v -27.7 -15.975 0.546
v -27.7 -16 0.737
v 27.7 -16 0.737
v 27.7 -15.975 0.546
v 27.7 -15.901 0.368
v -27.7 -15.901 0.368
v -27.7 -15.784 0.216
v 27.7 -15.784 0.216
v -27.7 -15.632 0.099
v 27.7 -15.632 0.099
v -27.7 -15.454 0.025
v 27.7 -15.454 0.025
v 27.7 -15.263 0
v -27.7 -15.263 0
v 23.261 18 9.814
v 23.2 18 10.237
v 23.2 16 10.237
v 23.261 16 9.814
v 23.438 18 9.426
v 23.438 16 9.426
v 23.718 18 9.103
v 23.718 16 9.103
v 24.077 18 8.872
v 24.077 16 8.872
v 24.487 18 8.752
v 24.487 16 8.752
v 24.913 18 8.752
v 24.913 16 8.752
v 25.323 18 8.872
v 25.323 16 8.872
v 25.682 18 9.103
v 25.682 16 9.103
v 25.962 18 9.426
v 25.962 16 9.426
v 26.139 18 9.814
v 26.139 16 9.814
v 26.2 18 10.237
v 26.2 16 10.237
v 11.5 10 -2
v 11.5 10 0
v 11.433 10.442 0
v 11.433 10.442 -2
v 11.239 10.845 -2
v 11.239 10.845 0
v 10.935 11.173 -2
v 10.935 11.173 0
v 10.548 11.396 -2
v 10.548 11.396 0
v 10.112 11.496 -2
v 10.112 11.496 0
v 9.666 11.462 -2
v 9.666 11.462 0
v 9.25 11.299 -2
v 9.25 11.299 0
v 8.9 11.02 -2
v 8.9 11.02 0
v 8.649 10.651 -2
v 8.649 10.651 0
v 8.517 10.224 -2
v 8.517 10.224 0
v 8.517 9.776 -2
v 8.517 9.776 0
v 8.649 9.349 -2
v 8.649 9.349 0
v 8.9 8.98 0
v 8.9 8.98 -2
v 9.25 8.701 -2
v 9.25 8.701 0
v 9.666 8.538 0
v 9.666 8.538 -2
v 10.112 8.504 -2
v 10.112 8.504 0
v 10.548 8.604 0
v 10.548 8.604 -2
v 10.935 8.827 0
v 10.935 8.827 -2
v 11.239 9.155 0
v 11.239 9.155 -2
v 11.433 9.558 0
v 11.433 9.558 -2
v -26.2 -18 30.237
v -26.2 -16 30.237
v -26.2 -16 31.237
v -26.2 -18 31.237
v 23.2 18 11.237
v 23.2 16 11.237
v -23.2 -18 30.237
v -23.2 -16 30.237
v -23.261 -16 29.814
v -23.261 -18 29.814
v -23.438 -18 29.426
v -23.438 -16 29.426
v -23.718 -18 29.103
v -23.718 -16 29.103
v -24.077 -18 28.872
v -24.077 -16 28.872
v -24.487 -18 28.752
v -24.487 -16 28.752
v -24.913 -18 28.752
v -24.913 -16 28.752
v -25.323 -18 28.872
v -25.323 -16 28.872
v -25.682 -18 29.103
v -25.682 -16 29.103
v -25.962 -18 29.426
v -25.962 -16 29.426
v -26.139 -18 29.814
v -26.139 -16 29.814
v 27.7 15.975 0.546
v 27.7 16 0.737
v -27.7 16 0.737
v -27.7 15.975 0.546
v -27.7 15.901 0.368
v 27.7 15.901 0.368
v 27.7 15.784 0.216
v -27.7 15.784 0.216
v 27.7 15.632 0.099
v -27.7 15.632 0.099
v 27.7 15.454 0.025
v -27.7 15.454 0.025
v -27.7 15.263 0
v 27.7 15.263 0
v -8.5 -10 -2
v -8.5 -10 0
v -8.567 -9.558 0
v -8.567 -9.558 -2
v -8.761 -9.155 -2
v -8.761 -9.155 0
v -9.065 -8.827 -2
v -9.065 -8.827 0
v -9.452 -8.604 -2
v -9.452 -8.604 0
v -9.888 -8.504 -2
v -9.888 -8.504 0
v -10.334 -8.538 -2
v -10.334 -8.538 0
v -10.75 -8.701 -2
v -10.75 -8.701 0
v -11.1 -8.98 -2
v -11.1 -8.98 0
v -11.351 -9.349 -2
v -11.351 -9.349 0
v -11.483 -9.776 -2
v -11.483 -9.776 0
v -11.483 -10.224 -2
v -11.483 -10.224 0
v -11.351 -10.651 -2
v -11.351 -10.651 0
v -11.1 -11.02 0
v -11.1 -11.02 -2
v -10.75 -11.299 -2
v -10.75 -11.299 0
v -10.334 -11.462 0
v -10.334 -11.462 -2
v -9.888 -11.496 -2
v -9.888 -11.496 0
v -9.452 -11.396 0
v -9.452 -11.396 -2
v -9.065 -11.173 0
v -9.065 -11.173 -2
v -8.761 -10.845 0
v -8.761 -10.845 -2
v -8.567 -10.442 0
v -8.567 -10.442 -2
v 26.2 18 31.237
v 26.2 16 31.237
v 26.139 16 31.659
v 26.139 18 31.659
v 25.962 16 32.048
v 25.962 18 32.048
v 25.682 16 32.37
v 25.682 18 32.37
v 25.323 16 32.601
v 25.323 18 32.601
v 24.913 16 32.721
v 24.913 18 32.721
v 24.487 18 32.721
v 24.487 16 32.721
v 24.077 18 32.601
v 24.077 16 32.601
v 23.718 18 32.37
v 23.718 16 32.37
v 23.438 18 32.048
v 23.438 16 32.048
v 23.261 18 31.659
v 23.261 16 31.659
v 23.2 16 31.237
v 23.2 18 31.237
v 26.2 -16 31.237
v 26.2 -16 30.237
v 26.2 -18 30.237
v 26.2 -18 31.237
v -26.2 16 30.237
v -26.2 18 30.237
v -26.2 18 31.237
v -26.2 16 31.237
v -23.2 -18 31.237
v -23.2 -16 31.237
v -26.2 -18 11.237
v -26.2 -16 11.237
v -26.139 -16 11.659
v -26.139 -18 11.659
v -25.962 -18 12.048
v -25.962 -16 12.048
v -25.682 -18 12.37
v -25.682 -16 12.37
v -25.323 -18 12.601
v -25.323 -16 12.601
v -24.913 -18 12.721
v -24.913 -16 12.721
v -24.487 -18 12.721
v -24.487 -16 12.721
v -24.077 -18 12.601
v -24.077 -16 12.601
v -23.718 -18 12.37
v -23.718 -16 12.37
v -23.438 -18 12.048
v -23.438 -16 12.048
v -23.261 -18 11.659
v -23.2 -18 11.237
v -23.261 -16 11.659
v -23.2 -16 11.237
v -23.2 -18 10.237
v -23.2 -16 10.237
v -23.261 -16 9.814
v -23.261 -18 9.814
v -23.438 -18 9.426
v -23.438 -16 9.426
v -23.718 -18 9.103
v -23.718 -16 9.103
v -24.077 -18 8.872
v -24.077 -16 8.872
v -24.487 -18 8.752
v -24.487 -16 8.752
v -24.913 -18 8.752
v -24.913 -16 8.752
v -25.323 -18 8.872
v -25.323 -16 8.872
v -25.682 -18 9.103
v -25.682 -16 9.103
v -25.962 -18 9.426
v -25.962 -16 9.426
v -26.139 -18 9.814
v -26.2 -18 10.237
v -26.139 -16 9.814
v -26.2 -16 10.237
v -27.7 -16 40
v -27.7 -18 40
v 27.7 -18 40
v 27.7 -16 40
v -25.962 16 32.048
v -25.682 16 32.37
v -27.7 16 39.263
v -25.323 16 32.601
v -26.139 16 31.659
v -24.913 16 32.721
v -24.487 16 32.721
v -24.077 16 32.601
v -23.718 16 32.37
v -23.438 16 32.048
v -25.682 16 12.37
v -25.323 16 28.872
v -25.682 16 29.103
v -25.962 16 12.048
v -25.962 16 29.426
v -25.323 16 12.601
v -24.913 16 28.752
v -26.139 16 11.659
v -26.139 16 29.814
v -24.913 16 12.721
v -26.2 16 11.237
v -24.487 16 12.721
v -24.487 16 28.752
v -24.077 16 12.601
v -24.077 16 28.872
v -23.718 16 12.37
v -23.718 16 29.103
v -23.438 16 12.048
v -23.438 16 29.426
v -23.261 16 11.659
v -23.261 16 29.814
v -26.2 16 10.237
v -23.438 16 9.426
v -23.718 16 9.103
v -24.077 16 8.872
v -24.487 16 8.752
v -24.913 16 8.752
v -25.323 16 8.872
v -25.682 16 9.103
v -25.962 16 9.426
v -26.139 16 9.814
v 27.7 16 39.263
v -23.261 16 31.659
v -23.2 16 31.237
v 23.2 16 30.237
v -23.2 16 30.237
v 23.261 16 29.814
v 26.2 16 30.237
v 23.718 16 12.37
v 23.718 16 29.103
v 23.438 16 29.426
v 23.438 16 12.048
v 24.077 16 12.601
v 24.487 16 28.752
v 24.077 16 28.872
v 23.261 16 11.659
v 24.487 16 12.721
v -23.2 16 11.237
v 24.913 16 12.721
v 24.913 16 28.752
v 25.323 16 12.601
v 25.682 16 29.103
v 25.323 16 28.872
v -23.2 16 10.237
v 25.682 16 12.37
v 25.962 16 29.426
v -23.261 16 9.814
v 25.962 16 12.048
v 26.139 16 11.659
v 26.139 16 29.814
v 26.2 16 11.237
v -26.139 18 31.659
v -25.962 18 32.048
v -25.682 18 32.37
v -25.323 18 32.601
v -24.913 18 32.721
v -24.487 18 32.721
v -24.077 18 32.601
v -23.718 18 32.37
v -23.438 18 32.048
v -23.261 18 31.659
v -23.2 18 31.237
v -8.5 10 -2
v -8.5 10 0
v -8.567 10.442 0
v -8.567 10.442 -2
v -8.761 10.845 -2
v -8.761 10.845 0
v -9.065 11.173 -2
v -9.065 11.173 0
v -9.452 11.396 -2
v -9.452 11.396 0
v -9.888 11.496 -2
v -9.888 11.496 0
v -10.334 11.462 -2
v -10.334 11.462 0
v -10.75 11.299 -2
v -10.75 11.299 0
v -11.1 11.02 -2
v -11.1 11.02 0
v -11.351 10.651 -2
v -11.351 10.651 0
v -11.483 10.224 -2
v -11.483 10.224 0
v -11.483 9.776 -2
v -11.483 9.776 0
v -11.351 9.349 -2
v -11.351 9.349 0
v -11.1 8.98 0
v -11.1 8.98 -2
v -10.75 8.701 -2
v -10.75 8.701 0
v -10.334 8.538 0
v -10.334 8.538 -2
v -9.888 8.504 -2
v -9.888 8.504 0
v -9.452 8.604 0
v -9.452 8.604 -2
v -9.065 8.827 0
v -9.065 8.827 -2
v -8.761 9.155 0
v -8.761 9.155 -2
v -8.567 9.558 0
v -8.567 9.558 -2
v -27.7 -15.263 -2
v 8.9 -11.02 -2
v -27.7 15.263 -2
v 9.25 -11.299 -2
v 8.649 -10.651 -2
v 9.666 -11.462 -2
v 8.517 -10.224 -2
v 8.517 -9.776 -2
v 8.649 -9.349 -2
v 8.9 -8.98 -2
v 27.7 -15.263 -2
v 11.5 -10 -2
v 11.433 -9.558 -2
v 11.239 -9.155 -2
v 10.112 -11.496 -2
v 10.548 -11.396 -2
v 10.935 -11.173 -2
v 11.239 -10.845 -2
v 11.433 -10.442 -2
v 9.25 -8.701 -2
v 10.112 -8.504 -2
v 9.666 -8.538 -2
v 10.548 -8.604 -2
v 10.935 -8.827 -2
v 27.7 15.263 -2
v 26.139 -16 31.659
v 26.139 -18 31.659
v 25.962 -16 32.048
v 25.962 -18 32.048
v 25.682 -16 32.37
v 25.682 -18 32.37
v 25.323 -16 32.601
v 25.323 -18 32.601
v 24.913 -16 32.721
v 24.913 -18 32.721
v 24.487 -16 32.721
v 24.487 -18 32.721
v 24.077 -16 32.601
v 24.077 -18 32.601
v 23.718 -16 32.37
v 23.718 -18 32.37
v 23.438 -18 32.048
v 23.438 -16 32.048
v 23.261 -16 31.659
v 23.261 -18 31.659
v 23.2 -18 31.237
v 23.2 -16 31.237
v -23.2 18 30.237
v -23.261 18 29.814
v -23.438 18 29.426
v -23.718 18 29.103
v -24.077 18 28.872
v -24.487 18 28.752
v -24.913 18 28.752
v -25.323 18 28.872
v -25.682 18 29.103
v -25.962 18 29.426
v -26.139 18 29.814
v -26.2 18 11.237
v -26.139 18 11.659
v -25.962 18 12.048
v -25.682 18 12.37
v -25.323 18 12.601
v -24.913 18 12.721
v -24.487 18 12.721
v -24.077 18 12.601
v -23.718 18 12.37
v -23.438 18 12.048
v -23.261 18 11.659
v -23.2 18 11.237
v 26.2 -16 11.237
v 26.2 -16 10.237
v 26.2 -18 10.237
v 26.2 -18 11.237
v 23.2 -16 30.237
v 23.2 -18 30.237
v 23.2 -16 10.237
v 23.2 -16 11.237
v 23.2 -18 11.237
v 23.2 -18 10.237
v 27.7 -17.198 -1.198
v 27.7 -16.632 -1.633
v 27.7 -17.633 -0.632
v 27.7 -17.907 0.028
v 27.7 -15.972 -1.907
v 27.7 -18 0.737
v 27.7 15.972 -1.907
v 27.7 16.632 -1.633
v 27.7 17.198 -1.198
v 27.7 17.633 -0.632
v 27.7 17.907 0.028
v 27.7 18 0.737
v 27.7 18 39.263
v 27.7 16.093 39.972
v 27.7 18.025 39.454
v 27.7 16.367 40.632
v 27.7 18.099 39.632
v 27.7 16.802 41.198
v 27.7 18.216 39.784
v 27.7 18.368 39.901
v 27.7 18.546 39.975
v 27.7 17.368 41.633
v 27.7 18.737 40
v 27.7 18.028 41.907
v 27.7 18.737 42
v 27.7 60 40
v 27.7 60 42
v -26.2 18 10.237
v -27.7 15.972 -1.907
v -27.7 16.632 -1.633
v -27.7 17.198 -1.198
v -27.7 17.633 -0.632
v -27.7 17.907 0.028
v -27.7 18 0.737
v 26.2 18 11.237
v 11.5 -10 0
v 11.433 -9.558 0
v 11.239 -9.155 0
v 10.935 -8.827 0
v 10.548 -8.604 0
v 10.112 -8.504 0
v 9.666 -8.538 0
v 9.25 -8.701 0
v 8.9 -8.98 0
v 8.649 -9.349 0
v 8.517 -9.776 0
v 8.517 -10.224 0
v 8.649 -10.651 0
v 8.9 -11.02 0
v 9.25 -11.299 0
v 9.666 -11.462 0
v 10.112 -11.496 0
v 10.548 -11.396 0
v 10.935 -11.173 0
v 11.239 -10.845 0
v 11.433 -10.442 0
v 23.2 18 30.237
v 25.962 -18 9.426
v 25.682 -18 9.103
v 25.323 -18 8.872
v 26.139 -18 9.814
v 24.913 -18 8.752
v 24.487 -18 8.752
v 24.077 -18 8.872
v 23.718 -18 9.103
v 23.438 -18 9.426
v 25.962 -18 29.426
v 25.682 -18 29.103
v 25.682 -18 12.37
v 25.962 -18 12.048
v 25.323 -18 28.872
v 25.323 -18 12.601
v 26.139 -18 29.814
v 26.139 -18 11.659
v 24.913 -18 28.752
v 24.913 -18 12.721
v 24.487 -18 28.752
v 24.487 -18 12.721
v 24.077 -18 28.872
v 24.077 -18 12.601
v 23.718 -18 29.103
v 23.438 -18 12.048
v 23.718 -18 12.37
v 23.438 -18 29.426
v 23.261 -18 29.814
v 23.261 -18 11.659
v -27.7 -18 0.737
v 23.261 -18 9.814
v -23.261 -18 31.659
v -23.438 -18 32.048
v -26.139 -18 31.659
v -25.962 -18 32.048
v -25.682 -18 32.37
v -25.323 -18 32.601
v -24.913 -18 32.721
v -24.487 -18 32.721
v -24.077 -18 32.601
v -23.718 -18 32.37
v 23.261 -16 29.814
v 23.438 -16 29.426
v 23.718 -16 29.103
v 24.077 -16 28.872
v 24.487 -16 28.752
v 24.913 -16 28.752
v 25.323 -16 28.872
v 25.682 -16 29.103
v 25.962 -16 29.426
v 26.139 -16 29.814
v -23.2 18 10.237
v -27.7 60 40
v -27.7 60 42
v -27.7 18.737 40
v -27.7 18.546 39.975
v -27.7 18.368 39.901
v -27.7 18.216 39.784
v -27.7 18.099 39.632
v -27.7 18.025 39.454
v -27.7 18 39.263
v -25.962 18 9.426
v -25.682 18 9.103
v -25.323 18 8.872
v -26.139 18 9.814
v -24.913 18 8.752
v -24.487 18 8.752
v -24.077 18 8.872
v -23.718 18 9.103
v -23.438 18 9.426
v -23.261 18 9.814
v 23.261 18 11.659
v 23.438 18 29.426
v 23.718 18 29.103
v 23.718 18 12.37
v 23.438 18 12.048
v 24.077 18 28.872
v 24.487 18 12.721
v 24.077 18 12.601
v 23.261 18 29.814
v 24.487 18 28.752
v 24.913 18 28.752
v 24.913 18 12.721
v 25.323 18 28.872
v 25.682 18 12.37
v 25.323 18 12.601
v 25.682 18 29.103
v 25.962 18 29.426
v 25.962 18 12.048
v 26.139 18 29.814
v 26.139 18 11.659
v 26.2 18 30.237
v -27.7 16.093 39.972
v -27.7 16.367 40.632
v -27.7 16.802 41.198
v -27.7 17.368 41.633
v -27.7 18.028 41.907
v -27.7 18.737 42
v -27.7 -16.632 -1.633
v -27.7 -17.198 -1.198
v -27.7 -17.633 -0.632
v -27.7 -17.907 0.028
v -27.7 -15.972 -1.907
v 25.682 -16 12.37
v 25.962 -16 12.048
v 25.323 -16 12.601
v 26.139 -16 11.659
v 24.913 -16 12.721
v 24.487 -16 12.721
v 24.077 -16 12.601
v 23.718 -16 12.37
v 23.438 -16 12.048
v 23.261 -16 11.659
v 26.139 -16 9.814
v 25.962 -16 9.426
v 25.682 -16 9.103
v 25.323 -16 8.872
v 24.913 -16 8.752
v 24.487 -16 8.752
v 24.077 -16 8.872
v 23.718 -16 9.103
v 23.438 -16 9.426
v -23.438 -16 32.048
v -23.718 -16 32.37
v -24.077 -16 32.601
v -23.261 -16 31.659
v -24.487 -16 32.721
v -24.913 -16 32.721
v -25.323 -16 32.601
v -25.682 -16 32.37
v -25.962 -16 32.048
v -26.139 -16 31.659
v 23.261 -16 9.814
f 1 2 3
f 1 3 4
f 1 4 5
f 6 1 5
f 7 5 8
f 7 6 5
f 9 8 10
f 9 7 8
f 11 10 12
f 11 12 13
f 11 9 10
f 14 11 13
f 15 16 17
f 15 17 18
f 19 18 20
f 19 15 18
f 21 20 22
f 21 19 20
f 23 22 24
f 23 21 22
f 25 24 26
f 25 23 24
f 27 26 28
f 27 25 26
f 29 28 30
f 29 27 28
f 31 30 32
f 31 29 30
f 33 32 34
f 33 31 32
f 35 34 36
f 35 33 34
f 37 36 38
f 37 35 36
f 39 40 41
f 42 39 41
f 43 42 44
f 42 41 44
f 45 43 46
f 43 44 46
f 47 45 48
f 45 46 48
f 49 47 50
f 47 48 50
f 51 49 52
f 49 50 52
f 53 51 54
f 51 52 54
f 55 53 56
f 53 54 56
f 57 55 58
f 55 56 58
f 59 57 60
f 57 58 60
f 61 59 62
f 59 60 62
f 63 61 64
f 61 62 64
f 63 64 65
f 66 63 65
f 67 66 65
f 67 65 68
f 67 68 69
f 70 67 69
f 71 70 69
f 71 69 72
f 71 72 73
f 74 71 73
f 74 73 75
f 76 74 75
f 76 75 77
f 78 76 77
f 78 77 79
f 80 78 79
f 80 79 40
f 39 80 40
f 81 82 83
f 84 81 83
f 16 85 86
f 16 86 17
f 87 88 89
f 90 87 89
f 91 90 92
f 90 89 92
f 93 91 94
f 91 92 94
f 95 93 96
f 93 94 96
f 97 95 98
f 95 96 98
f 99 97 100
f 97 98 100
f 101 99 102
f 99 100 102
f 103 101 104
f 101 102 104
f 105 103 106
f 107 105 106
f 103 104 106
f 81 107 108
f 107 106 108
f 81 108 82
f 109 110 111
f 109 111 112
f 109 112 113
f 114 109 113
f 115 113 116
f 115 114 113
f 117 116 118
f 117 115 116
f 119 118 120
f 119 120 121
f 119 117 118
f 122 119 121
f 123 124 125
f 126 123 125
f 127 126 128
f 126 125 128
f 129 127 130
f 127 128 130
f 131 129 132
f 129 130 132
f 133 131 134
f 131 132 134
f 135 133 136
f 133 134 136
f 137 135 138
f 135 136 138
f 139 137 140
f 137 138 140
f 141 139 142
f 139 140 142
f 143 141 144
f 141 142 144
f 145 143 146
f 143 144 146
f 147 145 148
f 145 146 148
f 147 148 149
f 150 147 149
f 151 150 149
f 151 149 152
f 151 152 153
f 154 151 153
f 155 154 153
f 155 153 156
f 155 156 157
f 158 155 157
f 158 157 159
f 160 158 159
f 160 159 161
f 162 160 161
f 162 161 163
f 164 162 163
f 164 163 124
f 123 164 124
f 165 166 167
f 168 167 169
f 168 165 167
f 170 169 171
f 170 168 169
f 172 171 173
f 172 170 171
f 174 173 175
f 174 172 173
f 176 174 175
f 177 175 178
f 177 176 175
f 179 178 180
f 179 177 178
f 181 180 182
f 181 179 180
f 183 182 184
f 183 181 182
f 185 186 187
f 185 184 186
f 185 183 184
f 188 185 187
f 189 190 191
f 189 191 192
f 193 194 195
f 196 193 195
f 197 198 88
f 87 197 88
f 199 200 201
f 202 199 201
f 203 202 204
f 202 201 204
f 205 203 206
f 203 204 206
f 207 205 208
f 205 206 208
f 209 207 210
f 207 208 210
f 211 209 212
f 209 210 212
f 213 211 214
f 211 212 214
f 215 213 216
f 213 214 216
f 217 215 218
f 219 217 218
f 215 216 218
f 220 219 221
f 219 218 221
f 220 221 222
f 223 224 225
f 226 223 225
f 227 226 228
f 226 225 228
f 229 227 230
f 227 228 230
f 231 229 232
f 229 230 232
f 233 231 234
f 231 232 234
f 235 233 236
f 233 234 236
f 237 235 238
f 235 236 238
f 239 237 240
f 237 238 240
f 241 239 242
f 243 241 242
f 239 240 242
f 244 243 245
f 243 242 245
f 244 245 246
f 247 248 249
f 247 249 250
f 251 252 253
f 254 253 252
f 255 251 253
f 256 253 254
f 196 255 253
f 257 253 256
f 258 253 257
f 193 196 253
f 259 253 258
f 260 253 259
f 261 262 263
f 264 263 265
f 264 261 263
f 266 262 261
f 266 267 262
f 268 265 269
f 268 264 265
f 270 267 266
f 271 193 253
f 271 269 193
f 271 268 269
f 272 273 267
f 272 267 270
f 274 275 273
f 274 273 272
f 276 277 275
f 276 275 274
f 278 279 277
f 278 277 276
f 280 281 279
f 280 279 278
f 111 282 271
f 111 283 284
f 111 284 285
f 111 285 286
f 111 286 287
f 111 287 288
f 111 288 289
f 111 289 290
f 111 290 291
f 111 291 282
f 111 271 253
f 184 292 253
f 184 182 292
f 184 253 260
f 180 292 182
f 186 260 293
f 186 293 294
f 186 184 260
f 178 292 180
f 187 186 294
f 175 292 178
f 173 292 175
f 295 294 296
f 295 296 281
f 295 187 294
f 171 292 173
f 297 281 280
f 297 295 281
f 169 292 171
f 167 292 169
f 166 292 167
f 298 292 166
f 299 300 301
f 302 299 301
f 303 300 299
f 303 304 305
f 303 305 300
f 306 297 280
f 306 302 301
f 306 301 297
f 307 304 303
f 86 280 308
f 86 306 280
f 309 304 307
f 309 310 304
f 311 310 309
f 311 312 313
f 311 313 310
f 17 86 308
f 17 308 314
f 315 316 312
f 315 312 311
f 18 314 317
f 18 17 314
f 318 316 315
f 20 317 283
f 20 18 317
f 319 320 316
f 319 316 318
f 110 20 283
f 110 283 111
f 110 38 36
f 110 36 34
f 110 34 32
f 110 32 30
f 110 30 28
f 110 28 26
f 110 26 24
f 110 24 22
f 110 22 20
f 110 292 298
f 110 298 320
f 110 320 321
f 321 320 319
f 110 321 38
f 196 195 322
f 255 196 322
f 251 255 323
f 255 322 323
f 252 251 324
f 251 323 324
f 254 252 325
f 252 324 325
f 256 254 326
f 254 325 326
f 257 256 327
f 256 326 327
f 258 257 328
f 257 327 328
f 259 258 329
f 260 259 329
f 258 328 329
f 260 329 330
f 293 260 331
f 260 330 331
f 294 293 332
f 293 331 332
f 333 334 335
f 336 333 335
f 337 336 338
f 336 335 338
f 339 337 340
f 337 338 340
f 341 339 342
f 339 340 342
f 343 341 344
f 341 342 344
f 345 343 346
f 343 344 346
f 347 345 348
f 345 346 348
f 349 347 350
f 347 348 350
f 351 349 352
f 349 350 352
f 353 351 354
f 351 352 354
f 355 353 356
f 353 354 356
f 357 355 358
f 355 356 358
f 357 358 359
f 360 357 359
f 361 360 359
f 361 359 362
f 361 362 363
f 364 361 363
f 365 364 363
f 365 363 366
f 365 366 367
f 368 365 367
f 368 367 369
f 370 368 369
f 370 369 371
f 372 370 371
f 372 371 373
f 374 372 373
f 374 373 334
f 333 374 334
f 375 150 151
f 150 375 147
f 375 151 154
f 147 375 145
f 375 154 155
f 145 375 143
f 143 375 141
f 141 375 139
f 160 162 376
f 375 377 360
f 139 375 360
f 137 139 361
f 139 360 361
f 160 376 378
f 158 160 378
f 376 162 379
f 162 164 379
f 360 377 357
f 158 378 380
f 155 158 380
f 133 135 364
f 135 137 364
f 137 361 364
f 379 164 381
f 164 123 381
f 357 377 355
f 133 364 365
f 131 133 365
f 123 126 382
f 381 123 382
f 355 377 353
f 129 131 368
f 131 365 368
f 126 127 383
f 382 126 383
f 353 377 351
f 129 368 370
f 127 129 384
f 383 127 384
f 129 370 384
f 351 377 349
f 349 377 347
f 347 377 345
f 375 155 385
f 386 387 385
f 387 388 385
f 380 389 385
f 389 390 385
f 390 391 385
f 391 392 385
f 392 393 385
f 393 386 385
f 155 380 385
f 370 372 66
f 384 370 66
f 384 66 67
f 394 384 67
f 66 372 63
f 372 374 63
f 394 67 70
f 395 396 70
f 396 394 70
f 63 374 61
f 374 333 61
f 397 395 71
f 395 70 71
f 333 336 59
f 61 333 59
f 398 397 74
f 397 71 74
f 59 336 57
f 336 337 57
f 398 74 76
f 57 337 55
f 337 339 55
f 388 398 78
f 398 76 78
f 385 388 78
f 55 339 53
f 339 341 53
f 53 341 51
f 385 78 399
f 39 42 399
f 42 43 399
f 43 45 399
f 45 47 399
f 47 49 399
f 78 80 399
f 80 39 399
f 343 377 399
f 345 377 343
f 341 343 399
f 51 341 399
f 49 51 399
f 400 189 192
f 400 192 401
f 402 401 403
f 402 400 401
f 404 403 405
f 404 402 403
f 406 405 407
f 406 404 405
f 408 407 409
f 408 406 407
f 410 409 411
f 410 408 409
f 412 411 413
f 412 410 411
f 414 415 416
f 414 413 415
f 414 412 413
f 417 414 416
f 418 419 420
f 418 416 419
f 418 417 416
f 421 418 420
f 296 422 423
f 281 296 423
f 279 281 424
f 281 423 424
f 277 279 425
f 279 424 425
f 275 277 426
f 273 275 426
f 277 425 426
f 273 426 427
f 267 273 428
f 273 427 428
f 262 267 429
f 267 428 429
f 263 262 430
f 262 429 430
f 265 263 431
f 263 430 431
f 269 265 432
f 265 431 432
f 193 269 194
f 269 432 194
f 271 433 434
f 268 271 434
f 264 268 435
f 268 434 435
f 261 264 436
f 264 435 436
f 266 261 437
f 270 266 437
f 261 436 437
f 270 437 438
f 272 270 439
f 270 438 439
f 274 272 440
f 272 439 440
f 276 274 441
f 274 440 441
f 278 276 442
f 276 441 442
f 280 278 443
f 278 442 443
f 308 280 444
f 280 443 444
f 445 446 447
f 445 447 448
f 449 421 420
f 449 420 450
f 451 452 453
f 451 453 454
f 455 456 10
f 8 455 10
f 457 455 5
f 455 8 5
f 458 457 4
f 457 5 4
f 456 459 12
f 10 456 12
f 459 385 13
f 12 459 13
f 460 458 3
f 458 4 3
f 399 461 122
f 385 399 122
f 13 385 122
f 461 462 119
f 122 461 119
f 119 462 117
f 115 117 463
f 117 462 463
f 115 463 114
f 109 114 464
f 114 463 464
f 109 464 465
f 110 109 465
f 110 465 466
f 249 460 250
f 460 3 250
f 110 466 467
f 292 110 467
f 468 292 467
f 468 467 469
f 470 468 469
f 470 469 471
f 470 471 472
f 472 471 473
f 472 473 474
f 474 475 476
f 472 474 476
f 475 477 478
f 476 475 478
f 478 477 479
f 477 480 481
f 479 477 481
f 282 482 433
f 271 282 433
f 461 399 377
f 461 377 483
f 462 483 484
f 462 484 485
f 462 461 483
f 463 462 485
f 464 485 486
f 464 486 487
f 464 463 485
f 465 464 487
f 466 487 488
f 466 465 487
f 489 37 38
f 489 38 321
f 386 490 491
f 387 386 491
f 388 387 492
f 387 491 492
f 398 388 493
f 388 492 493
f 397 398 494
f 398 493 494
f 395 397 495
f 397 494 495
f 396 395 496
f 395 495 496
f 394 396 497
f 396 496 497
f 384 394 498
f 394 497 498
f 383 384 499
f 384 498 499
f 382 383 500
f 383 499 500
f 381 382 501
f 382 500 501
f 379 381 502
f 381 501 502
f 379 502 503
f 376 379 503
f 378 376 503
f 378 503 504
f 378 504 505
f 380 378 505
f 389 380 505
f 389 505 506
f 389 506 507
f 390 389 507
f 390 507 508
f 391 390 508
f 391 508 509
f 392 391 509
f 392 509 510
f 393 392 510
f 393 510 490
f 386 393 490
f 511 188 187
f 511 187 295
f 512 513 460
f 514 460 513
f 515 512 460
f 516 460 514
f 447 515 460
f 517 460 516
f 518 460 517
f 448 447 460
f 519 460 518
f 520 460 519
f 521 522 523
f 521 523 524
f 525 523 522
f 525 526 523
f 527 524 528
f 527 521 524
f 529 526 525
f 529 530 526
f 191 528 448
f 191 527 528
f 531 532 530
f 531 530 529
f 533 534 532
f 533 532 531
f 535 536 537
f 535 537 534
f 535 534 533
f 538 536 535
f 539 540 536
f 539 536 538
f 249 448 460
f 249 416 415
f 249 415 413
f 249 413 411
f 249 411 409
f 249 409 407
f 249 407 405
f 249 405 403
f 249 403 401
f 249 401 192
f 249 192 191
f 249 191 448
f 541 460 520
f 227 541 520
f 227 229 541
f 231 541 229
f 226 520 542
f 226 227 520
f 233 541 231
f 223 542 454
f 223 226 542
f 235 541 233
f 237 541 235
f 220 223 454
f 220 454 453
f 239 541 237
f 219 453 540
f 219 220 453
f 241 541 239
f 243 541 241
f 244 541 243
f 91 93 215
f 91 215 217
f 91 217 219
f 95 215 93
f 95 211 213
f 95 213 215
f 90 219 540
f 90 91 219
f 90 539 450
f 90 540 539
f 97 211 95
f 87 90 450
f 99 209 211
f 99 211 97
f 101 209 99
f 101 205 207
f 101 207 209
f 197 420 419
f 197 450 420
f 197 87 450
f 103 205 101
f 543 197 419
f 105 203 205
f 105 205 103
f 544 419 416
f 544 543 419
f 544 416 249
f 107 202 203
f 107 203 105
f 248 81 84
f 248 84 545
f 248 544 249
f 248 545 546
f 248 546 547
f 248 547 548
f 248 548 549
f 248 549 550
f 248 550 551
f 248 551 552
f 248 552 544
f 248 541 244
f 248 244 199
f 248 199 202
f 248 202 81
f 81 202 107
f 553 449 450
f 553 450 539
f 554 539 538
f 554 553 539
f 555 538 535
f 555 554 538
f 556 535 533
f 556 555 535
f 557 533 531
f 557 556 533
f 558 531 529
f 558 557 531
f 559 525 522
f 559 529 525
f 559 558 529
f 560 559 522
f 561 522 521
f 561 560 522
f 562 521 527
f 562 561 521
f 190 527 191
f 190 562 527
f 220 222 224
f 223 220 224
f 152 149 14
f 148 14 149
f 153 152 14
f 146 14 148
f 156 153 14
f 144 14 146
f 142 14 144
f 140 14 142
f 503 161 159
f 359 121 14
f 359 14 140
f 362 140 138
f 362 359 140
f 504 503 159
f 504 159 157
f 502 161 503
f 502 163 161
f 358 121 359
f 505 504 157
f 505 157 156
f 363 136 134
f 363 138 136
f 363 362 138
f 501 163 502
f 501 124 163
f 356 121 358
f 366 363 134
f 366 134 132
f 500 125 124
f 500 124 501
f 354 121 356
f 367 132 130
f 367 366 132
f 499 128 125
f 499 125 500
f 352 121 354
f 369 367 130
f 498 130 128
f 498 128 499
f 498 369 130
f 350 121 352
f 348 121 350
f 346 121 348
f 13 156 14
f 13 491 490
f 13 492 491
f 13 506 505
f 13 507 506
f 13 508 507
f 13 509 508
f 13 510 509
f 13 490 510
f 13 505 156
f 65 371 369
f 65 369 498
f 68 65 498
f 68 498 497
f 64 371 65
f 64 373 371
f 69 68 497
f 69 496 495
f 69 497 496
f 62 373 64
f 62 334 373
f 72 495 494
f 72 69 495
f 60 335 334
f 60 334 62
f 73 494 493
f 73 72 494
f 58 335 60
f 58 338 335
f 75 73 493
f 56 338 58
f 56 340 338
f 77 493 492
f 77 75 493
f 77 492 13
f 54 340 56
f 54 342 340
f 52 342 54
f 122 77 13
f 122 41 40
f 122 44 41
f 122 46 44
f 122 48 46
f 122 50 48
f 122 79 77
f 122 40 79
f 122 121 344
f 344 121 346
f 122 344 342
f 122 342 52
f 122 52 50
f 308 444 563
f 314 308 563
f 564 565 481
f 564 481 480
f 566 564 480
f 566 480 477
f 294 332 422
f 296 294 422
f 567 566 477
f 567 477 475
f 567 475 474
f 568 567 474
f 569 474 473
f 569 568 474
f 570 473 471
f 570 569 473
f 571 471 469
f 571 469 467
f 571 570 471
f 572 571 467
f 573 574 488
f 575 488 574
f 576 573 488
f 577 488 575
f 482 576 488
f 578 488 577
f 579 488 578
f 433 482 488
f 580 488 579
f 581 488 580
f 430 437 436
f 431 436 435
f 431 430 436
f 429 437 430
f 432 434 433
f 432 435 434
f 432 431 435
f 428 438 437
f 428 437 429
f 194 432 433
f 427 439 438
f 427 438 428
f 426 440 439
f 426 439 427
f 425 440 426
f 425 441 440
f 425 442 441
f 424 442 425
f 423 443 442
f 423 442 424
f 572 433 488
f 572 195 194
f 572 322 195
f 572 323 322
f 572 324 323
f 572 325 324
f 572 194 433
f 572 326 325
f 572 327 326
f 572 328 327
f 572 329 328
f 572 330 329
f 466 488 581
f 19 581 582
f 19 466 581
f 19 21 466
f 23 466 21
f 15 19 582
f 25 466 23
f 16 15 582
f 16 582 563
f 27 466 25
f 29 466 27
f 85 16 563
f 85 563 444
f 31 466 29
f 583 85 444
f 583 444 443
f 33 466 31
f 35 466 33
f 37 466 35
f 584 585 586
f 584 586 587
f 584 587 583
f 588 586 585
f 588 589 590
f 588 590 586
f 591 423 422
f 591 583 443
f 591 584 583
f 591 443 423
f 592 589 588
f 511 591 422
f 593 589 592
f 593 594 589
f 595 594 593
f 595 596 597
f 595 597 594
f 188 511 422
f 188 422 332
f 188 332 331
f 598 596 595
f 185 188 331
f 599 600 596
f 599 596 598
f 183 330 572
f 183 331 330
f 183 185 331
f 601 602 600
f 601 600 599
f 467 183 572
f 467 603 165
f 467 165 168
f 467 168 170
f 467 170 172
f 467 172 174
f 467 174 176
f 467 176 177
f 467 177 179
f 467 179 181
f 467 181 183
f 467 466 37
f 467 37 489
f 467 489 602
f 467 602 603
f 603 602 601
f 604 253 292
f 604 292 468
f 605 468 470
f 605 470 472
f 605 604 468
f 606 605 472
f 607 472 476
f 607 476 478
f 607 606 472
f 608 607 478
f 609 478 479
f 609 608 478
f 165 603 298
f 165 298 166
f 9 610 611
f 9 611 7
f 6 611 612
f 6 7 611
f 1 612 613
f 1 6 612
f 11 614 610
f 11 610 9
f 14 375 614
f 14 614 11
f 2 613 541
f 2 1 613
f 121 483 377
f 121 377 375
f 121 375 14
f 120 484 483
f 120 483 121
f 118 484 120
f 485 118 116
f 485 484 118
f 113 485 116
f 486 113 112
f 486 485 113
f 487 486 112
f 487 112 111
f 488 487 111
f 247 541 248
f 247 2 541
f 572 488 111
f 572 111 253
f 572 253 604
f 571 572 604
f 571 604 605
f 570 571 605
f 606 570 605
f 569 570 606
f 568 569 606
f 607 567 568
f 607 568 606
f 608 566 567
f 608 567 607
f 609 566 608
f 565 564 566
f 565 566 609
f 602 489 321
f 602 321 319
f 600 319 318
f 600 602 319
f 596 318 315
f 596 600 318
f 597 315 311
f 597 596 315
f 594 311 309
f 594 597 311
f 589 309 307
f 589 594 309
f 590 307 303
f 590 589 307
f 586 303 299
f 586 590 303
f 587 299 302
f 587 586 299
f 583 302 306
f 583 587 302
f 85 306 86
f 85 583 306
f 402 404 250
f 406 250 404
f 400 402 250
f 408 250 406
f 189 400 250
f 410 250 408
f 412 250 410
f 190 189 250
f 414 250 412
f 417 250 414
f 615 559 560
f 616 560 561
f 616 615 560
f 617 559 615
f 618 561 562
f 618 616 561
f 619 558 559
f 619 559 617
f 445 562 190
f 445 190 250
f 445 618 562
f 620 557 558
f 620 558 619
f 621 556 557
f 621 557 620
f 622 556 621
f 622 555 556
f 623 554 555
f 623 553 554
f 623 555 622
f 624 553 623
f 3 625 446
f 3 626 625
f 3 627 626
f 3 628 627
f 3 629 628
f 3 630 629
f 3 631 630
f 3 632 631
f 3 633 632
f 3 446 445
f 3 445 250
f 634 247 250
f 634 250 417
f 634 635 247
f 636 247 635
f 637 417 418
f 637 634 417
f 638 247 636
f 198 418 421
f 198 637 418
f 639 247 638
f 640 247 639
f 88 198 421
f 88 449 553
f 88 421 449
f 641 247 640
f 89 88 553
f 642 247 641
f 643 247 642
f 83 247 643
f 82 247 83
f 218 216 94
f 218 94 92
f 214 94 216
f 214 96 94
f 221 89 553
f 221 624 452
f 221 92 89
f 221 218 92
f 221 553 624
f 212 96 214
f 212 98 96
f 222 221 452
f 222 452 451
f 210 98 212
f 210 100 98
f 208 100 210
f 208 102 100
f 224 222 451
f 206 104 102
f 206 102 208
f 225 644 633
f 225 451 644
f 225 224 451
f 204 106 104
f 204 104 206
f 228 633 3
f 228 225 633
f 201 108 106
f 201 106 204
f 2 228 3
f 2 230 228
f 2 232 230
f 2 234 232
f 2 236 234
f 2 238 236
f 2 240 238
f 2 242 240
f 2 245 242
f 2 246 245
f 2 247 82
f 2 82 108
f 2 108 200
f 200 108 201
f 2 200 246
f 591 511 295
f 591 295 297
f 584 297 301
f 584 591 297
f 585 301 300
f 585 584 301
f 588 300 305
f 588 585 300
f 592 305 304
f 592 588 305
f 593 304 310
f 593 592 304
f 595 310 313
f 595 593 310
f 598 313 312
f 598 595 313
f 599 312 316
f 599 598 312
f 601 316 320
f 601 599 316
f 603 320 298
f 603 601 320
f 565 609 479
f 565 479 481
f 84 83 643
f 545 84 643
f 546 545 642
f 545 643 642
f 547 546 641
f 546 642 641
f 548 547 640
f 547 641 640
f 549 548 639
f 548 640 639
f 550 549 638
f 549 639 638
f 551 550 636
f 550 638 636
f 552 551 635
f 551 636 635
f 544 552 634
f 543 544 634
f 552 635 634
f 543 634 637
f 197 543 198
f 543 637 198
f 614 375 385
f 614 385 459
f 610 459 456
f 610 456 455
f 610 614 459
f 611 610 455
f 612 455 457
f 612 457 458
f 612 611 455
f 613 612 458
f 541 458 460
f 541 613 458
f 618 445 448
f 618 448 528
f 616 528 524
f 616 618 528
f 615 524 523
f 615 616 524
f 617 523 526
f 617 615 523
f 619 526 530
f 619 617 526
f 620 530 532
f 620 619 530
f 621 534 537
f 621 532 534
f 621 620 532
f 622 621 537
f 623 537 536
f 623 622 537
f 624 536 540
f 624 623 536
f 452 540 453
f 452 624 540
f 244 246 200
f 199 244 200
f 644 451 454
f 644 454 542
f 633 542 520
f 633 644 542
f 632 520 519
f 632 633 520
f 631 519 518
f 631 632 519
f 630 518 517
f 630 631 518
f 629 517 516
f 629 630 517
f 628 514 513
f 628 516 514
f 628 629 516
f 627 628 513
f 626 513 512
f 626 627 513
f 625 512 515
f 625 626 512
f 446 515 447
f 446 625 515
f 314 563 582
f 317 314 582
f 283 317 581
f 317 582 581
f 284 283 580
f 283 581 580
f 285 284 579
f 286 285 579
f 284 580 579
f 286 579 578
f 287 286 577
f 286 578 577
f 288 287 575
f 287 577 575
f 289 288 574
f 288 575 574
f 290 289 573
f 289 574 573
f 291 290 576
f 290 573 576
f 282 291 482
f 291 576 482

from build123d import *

# Parameters (mm, degrees)
SZKIC1_W                             = 55.4
SZKIC1_H                             = 32
ODGI_CIE_BAZOWE1_DEPTH               = 2
OTWORY_USTALAJ_CE_3_0MM1_D           = 3
OTWORY_USTALAJ_CE_3_0MM1_DEPTH       = 17
OTWORY_USTALAJ_CE_3_0MM1_TIP         = 0.901290929
ODGI_CIE_KRAW_DZI1_STRIP_W           = 9.4732
ODGI_CIE_KRAW_DZI1_STRIP_H           = 2
ODGI_CIE_KRAW_DZI1_STRIP_CUT_DEPTH   = 55.4
ODGI_CIE_KRAW_DZI1_STRIP_2_W         = 9.4732
ODGI_CIE_KRAW_DZI1_STRIP_2_H         = 2
ODGI_CIE_KRAW_DZI1_STRIP_CUT_2_DEPTH = 55.4
ODGI_CIE_KRAW_DZI1_DEPTH             = 55.4
ODGI_CIE_KRAW_DZI1_BEND_DEPTH        = 55.4
ODGI_CIE_KRAW_DZI2_STRIP_W           = 9.4732
ODGI_CIE_KRAW_DZI2_STRIP_H           = 2
ODGI_CIE_KRAW_DZI2_STRIP_CUT_DEPTH   = 55.4
ODGI_CIE_KRAW_DZI2_DEPTH             = 55.4
WYTNIJ_WYCI_GNI_CIE1_DEPTH           = 66.53846199


# Sheet-metal steps are written as plain solids
with BuildPart() as part:
    # Szkic1 → Odgięcie bazowe1 (new body)
    with BuildSketch(Plane.XY):
        Rectangle(SZKIC1_W, SZKIC1_H)
    extrude(amount=-ODGI_CIE_BAZOWE1_DEPTH)

    # Otwory ustalające Ø3.0mm1
    with Locations(Plane(origin=(0, 0, -2), x_dir=(-1, 0, 0), z_dir=(0, 0, -1))):
        with Locations((-10, 10), (10, 10), (10, -10), (-10, -10)):
            Hole(OTWORY_USTALAJ_CE_3_0MM1_D / 2, depth=OTWORY_USTALAJ_CE_3_0MM1_DEPTH)
            with Locations((0, 0, -(OTWORY_USTALAJ_CE_3_0MM1_DEPTH + OTWORY_USTALAJ_CE_3_0MM1_TIP / 2))):  # 118° drill point
                Cone(0, OTWORY_USTALAJ_CE_3_0MM1_D / 2, OTWORY_USTALAJ_CE_3_0MM1_TIP, mode=Mode.SUBTRACT)

    # Odgięcie krawędzi1 strip (across the edge) → Odgięcie krawędzi1 strip cut (cut)
    with BuildSketch(Plane(origin=(27.7, 16, 0), x_dir=(0, -1, 0), z_dir=(-1, 0, 0))):
        with Locations((-4, -1)):
            Rectangle(ODGI_CIE_KRAW_DZI1_STRIP_W, ODGI_CIE_KRAW_DZI1_STRIP_H)
    extrude(amount=ODGI_CIE_KRAW_DZI1_STRIP_CUT_DEPTH, mode=Mode.SUBTRACT)

    # Odgięcie krawędzi1 strip 2 (across the edge) → Odgięcie krawędzi1 strip cut 2 (cut)
    with BuildSketch(Plane(origin=(-27.7, -16, 0), x_dir=(0, 1, 0), z_dir=(1, 0, 0))):
        with Locations((-4, -1)):
            Rectangle(ODGI_CIE_KRAW_DZI1_STRIP_2_W, ODGI_CIE_KRAW_DZI1_STRIP_2_H)
    extrude(amount=ODGI_CIE_KRAW_DZI1_STRIP_CUT_2_DEPTH, mode=Mode.SUBTRACT)

    # Odgięcie krawędzi1 section (across the edge) → Odgięcie krawędzi1 (add)
    with BuildSketch(Plane(origin=(27.7, 16, 0), x_dir=(0, -1, 0), z_dir=(-1, 0, 0))):
        with BuildLine():
            Line((-2, 0.7366), (-2, 40))
            Line((-2, 40), (0, 40))
            Line((0, 40), (0, 0.7366))
            ThreePointArc((0, 0.7366), (0.215745145, 0.215745145), (0.7366, 0))
            Line((0.7366, 0), (0.7366, -2))
            ThreePointArc((0.7366, -2), (-1.198468417, -1.198468417), (-2, 0.7366))
        make_face()
    extrude(amount=ODGI_CIE_KRAW_DZI1_DEPTH)

    # Odgięcie krawędzi1 section 2 (across the edge) → Odgięcie krawędzi1 bend (add)
    with BuildSketch(Plane(origin=(-27.7, -16, 0), x_dir=(0, 1, 0), z_dir=(1, 0, 0))):
        with BuildLine():
            Line((-2, 0.7366), (-2, 40))
            Line((-2, 40), (0, 40))
            Line((0, 40), (0, 0.7366))
            ThreePointArc((0, 0.7366), (0.215745145, 0.215745145), (0.7366, 0))
            Line((0.7366, 0), (0.7366, -2))
            ThreePointArc((0.7366, -2), (-1.198468417, -1.198468417), (-2, 0.7366))
        make_face()
    extrude(amount=ODGI_CIE_KRAW_DZI1_BEND_DEPTH)

    # Odgięcie krawędzi2 strip (across the edge) → Odgięcie krawędzi2 strip cut (cut)
    with BuildSketch(Plane(origin=(-27.7, 18, 40), x_dir=(0, 0, -1), z_dir=(1, 0, 0))):
        with Locations((-4, -1)):
            Rectangle(ODGI_CIE_KRAW_DZI2_STRIP_W, ODGI_CIE_KRAW_DZI2_STRIP_H)
    extrude(amount=ODGI_CIE_KRAW_DZI2_STRIP_CUT_DEPTH, mode=Mode.SUBTRACT)

    # Odgięcie krawędzi2 section (across the edge) → Odgięcie krawędzi2 (add)
    with BuildSketch(Plane(origin=(-27.7, 18, 40), x_dir=(0, 0, -1), z_dir=(1, 0, 0))):
        with BuildLine():
            Line((-2, 0.7366), (-2, 42))
            Line((-2, 42), (0, 42))
            Line((0, 42), (0, 0.7366))
            ThreePointArc((0, 0.7366), (0.215745145, 0.215745145), (0.7366, 0))
            Line((0.7366, 0), (0.7366, -2))
            ThreePointArc((0.7366, -2), (-1.198468417, -1.198468417), (-2, 0.7366))
        make_face()
    extrude(amount=ODGI_CIE_KRAW_DZI2_DEPTH)

    # Szkic16 → Wytnij-wyciągnięcie1 (cut, through all)
    with BuildSketch(Plane(origin=(0, 18, 0), x_dir=(1, 0, 0), z_dir=(0, 1, 0))):
        with BuildLine():
            Line((26.2, -30.2366), (26.2, -31.2366))
            ThreePointArc((26.2, -31.2366), (24.7, -32.7366), (23.2, -31.2366))
            Line((23.2, -31.2366), (23.2, -30.2366))
            ThreePointArc((23.2, -30.2366), (24.7, -28.7366), (26.2, -30.2366))
        make_face()
        with BuildLine():
            Line((26.2, -10.2366), (26.2, -11.2366))
            ThreePointArc((26.2, -11.2366), (24.7, -12.7366), (23.2, -11.2366))
            Line((23.2, -11.2366), (23.2, -10.2366))
            ThreePointArc((23.2, -10.2366), (24.7, -8.7366), (26.2, -10.2366))
        make_face()
        with BuildLine():
            Line((-26.2, -10.2366), (-26.2, -11.2366))
            ThreePointArc((-26.2, -11.2366), (-24.7, -12.7366), (-23.2, -11.2366))
            Line((-23.2, -11.2366), (-23.2, -10.2366))
            ThreePointArc((-23.2, -10.2366), (-24.7, -8.7366), (-26.2, -10.2366))
        make_face()
        with BuildLine():
            Line((-26.2, -30.2366), (-26.2, -31.2366))
            ThreePointArc((-26.2, -31.2366), (-24.7, -32.7366), (-23.2, -31.2366))
            Line((-23.2, -31.2366), (-23.2, -30.2366))
            ThreePointArc((-23.2, -30.2366), (-24.7, -28.7366), (-26.2, -30.2366))
        make_face()
    extrude(amount=-WYTNIJ_WYCI_GNI_CIE1_DEPTH, mode=Mode.SUBTRACT)


solid = part.part
